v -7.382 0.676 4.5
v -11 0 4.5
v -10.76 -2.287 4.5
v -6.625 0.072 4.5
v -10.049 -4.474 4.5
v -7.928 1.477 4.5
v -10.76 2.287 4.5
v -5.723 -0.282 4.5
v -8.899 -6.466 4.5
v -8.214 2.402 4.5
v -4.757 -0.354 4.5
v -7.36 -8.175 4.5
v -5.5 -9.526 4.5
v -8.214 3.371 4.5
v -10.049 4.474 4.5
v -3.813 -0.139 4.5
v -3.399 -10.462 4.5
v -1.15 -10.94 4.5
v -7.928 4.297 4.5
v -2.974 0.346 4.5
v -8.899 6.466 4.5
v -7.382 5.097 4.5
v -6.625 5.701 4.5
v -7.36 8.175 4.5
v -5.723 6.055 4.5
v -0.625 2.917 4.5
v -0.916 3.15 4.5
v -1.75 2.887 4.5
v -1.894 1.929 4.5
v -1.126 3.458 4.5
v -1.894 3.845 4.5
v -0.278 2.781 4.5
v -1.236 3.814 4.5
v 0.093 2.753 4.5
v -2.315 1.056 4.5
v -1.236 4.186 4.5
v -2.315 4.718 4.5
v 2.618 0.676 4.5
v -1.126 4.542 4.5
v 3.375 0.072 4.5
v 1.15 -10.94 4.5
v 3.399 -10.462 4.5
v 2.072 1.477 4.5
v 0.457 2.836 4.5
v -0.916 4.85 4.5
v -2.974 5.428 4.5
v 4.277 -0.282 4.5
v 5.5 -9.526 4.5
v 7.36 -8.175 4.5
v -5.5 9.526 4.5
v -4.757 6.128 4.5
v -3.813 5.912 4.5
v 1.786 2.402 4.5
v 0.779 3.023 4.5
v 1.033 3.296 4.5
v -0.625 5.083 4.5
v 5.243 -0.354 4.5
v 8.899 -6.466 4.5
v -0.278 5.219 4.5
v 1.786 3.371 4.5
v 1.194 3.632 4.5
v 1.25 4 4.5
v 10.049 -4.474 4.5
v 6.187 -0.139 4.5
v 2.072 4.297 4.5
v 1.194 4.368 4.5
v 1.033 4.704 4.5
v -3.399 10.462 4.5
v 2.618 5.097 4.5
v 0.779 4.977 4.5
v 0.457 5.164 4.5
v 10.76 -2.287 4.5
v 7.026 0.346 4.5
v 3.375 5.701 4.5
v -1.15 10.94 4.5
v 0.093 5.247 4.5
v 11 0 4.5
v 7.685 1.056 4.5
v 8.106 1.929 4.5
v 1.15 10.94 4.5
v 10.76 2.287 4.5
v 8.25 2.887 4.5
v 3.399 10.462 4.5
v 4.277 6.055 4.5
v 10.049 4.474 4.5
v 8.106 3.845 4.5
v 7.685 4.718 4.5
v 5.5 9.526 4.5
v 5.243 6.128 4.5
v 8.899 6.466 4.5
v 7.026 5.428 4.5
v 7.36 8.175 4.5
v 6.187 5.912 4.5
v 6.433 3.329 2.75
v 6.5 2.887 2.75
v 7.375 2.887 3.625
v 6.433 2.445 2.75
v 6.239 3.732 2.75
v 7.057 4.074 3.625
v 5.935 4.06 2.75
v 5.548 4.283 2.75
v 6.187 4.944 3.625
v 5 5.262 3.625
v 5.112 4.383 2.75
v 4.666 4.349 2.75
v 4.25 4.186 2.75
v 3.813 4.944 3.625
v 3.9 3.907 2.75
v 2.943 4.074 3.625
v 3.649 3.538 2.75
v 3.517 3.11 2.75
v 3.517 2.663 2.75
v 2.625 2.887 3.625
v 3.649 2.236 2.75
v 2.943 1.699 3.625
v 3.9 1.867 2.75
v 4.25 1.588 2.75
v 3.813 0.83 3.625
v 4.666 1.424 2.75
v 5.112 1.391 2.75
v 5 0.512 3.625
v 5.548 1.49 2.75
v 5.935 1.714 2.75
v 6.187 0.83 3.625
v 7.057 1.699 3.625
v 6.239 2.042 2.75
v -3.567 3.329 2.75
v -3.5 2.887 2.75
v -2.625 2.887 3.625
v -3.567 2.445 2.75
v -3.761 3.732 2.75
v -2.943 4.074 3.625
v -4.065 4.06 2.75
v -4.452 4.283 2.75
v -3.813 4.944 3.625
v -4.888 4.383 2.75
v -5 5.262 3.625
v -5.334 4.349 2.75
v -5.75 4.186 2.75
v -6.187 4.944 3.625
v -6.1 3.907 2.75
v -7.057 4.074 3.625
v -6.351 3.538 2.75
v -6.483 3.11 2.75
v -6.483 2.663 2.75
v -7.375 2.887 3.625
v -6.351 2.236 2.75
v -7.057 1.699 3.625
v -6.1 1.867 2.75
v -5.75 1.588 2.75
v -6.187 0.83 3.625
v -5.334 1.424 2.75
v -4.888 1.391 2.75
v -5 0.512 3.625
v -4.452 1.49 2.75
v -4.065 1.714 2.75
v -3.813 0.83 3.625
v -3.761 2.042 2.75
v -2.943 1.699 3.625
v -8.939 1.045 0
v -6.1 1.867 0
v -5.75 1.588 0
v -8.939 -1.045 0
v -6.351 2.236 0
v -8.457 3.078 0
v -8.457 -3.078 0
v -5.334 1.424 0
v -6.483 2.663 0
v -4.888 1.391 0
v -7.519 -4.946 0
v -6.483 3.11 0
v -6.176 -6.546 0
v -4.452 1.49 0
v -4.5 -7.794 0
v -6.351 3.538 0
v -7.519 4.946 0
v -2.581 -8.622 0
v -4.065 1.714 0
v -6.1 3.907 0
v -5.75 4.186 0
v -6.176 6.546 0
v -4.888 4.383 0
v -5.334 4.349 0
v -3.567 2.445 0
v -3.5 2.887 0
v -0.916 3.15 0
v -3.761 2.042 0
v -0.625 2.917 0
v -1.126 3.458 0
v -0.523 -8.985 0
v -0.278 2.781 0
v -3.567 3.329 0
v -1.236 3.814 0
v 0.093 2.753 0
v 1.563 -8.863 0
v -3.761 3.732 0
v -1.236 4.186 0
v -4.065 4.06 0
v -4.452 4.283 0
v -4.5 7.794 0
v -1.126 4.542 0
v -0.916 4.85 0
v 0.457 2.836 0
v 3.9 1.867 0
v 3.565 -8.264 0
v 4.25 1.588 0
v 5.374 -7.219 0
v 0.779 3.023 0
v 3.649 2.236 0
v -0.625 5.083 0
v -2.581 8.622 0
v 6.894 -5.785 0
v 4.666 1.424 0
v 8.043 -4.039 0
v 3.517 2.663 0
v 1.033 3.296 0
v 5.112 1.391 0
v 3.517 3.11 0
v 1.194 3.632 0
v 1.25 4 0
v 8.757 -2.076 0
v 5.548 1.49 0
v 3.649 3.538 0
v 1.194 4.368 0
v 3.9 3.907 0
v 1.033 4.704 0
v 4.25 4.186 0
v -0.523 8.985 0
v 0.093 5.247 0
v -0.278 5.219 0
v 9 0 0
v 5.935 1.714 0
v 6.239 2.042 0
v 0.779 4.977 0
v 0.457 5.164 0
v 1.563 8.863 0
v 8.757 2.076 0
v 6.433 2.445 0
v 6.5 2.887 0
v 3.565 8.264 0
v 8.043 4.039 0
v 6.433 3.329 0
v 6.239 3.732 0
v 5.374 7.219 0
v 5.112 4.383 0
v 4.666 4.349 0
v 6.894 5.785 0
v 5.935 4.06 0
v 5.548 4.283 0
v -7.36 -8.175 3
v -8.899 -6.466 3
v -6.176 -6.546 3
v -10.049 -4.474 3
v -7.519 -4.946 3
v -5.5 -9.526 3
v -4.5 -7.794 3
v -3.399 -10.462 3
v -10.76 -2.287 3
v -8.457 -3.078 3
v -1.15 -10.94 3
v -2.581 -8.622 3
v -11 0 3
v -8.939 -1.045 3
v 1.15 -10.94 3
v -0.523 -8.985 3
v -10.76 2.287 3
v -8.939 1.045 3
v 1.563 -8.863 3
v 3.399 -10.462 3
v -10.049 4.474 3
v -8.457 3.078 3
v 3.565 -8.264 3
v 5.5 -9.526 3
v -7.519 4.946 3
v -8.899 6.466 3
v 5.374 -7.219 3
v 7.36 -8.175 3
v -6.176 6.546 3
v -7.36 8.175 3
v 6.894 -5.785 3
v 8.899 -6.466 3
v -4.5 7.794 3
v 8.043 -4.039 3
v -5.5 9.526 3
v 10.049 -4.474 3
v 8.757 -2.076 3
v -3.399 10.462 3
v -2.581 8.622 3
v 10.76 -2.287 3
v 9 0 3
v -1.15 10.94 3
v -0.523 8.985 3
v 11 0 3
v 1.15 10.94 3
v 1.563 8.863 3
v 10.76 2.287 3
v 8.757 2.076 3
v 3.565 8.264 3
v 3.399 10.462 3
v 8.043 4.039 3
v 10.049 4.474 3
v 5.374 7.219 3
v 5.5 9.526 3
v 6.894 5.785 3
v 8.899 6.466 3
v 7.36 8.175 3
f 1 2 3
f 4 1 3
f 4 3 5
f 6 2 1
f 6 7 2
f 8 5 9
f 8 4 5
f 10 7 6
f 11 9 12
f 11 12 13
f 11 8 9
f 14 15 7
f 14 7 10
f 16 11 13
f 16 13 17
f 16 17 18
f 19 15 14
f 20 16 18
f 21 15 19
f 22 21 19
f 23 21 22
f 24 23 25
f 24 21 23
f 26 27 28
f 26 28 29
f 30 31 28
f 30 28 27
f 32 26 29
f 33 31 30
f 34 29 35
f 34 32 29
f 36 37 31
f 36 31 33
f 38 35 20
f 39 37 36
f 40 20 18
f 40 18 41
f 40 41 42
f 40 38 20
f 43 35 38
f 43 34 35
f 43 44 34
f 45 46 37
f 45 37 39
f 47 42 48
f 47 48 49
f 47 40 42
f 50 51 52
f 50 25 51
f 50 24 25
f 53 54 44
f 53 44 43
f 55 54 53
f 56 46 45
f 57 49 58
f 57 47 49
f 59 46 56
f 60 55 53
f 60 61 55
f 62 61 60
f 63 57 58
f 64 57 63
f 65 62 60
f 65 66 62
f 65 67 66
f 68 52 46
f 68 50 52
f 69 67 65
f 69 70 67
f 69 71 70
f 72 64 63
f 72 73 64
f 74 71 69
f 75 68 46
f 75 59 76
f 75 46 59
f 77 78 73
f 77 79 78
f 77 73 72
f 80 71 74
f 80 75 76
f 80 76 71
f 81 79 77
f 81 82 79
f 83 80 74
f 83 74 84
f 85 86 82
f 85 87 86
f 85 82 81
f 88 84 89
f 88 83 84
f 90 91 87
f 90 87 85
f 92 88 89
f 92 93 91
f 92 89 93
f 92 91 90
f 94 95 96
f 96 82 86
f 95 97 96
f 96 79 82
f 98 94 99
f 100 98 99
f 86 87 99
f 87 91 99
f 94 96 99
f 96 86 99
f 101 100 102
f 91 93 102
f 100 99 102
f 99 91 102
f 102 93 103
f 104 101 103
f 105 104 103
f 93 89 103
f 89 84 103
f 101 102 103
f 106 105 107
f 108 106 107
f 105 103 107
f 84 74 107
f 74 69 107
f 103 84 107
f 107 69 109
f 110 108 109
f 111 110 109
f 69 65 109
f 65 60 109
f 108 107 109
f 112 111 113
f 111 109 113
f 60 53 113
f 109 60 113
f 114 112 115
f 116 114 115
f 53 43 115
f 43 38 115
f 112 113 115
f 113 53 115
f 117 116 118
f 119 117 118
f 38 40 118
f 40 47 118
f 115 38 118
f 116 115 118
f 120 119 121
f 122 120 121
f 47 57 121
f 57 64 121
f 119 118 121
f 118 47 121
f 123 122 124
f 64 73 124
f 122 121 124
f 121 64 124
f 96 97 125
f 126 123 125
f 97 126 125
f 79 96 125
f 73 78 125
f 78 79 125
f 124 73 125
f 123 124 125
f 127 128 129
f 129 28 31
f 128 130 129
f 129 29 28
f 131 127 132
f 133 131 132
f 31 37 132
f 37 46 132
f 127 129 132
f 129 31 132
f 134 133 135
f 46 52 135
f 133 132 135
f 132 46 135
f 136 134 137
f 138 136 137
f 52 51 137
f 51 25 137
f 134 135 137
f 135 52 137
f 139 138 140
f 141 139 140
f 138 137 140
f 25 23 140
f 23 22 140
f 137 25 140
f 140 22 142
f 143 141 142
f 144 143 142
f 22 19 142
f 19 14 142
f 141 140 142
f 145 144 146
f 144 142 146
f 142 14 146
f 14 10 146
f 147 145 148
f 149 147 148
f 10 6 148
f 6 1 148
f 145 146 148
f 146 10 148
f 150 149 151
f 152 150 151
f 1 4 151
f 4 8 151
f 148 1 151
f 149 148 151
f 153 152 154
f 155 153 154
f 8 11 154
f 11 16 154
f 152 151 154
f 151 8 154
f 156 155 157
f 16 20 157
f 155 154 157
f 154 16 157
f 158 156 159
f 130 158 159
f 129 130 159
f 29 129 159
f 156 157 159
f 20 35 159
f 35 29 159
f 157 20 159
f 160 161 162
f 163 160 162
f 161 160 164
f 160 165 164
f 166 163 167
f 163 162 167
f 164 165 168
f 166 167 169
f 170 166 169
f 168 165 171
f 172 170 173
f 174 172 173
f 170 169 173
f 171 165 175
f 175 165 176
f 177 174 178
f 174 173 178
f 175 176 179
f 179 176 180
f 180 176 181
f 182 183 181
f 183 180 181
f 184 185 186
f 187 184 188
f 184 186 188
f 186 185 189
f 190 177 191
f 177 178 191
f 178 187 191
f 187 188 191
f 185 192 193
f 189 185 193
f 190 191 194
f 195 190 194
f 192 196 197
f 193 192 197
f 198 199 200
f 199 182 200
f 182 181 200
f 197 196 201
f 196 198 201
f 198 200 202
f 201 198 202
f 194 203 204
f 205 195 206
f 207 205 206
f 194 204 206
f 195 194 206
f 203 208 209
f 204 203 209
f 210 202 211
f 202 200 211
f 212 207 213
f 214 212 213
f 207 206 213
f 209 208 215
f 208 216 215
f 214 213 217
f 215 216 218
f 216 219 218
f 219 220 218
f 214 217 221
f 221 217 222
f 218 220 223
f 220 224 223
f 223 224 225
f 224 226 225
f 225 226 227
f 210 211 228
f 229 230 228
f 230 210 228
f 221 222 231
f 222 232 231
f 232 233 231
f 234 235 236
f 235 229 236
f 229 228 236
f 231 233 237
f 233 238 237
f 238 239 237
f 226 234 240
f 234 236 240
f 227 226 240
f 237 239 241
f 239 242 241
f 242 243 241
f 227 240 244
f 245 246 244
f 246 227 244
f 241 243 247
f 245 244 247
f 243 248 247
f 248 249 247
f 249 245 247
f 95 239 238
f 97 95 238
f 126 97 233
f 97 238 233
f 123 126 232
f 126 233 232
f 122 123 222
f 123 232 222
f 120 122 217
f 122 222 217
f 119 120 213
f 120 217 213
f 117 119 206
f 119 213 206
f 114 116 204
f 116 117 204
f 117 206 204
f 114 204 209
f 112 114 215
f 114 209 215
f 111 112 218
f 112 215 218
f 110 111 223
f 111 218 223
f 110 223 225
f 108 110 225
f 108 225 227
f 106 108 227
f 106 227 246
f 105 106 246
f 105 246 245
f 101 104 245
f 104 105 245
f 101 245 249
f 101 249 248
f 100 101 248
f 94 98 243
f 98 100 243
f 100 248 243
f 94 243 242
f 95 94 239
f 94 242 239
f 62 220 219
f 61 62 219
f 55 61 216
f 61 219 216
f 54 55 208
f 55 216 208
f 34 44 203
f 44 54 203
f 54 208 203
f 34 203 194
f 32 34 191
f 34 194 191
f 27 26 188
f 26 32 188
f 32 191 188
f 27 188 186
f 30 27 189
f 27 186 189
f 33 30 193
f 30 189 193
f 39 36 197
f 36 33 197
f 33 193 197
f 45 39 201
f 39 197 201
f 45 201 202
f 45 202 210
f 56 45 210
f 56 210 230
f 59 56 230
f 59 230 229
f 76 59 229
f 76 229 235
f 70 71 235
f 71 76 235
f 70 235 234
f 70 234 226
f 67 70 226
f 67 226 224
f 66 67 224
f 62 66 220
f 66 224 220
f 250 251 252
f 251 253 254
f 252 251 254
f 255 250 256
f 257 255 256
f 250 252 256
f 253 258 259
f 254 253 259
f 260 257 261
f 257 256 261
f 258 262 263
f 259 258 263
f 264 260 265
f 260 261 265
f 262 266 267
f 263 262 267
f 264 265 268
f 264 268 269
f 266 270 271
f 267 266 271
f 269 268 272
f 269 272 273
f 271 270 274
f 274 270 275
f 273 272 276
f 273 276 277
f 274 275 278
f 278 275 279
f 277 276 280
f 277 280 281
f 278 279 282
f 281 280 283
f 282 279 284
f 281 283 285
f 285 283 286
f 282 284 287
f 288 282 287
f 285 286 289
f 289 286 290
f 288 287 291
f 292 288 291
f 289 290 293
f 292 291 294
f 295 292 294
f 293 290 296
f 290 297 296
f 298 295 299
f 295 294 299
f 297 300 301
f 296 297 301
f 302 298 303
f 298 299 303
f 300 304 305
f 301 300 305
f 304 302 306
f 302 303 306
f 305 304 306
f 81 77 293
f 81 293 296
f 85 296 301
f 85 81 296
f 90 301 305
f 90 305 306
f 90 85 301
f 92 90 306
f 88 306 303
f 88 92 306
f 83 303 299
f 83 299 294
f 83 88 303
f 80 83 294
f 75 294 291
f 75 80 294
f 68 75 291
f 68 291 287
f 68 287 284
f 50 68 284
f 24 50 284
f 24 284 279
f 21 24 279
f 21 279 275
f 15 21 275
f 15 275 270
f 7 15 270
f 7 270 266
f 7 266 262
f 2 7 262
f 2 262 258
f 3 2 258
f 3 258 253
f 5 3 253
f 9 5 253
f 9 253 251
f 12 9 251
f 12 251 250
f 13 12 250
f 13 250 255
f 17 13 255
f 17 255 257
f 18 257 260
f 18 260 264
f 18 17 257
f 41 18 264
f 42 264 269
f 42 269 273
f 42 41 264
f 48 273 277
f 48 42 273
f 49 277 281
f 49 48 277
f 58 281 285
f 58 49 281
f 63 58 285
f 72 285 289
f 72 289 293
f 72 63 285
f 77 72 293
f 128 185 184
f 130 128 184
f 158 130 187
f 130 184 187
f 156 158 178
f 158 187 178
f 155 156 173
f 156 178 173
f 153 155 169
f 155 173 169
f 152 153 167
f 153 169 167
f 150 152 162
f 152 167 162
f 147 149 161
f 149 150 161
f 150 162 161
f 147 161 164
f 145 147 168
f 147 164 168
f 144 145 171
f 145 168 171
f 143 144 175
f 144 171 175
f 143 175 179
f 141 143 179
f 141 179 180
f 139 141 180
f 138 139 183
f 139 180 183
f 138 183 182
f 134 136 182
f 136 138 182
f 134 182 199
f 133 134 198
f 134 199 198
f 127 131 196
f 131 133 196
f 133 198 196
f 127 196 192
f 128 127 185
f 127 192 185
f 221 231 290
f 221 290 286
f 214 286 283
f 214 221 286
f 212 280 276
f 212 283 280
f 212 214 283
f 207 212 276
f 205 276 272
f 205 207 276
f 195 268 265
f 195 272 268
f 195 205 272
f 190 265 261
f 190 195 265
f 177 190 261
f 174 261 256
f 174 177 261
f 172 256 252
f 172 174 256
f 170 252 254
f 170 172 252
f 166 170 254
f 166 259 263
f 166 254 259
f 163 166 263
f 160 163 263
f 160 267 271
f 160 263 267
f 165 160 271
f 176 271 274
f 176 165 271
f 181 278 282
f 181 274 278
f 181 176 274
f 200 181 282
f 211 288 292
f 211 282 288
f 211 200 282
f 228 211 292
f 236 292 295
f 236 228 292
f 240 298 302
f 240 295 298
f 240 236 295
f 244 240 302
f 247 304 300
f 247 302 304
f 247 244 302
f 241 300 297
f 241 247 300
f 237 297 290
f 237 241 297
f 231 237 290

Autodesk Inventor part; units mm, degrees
ref_plane "YZ Plane" through (0, 0, 0) normal (1, 0, 0) x (0, 1, 0)
ref_plane "XZ Plane" through (0, 0, 0) normal (0, 1, 0) x (-1, 0, 0)
ref_plane "XY Plane" through (0, 0, 0) normal (0, 0, 1) x (1, 0, 0)
sketch "スケッチ1" plane through (0, 0, 0) normal (0, 0, 1) x (1, 0, 0)
  circle A0 centre (0, 0) radius 9
  line L0 (-5, 2.8868) -> (5, 2.8868) construction
  line L1 (5, 2.8868) -> (0, -5.7735) construction
  line L2 (0, -5.7735) -> (-5, 2.8868) construction
  circle A1 centre (-5, 2.8868) radius 1.5
  circle A2 centre (5, 2.8868) radius 1.5
  circle A3 centre (0, -5.7735) radius 1.5
  circle A4 centre (0, 4) radius 1.25
  line L3 (0, 0) -> (0, 4) construction
  circle A5 centre (0, 0) radius 10
  dimension "d0" = 18
  dimension "d1" = 10
  dimension "d2" = 3
  dimension "d3" = 3
  dimension "d4" = 3
  dimension "d5" = 2.5
  dimension "d6" = 4
  dimension "d12" = 1
extrude "押し出し1" add sketch "スケッチ1" along normal blind 4.5 contours A0 | A3
sketch "スケッチ2" plane through (0, 0, 4.5) normal (0, 0, 1) x (1, 0, 0)
  circle A0 centre (0, 0) radius 11
  circle A1 centre (5, 2.8868) radius 1.5 projected
  circle A2 centre (-5, 2.8868) radius 1.5 projected
  circle A3 centre (0, 4) radius 1.25 projected
  circle A4 centre (0, 0) radius 9 projected
  dimension "d15" = 2
extrude "押し出し2" add sketch "スケッチ2" against normal blind 1.5 contours A0
chamfer "面取り2" distance 1.75 angle 45 2 edges at (-6.5, 2.8868, 4.5) (3.5, 2.8868, 4.5)
properties part number "横回転最終段カム" material "アルミニウム 2014-T4"
